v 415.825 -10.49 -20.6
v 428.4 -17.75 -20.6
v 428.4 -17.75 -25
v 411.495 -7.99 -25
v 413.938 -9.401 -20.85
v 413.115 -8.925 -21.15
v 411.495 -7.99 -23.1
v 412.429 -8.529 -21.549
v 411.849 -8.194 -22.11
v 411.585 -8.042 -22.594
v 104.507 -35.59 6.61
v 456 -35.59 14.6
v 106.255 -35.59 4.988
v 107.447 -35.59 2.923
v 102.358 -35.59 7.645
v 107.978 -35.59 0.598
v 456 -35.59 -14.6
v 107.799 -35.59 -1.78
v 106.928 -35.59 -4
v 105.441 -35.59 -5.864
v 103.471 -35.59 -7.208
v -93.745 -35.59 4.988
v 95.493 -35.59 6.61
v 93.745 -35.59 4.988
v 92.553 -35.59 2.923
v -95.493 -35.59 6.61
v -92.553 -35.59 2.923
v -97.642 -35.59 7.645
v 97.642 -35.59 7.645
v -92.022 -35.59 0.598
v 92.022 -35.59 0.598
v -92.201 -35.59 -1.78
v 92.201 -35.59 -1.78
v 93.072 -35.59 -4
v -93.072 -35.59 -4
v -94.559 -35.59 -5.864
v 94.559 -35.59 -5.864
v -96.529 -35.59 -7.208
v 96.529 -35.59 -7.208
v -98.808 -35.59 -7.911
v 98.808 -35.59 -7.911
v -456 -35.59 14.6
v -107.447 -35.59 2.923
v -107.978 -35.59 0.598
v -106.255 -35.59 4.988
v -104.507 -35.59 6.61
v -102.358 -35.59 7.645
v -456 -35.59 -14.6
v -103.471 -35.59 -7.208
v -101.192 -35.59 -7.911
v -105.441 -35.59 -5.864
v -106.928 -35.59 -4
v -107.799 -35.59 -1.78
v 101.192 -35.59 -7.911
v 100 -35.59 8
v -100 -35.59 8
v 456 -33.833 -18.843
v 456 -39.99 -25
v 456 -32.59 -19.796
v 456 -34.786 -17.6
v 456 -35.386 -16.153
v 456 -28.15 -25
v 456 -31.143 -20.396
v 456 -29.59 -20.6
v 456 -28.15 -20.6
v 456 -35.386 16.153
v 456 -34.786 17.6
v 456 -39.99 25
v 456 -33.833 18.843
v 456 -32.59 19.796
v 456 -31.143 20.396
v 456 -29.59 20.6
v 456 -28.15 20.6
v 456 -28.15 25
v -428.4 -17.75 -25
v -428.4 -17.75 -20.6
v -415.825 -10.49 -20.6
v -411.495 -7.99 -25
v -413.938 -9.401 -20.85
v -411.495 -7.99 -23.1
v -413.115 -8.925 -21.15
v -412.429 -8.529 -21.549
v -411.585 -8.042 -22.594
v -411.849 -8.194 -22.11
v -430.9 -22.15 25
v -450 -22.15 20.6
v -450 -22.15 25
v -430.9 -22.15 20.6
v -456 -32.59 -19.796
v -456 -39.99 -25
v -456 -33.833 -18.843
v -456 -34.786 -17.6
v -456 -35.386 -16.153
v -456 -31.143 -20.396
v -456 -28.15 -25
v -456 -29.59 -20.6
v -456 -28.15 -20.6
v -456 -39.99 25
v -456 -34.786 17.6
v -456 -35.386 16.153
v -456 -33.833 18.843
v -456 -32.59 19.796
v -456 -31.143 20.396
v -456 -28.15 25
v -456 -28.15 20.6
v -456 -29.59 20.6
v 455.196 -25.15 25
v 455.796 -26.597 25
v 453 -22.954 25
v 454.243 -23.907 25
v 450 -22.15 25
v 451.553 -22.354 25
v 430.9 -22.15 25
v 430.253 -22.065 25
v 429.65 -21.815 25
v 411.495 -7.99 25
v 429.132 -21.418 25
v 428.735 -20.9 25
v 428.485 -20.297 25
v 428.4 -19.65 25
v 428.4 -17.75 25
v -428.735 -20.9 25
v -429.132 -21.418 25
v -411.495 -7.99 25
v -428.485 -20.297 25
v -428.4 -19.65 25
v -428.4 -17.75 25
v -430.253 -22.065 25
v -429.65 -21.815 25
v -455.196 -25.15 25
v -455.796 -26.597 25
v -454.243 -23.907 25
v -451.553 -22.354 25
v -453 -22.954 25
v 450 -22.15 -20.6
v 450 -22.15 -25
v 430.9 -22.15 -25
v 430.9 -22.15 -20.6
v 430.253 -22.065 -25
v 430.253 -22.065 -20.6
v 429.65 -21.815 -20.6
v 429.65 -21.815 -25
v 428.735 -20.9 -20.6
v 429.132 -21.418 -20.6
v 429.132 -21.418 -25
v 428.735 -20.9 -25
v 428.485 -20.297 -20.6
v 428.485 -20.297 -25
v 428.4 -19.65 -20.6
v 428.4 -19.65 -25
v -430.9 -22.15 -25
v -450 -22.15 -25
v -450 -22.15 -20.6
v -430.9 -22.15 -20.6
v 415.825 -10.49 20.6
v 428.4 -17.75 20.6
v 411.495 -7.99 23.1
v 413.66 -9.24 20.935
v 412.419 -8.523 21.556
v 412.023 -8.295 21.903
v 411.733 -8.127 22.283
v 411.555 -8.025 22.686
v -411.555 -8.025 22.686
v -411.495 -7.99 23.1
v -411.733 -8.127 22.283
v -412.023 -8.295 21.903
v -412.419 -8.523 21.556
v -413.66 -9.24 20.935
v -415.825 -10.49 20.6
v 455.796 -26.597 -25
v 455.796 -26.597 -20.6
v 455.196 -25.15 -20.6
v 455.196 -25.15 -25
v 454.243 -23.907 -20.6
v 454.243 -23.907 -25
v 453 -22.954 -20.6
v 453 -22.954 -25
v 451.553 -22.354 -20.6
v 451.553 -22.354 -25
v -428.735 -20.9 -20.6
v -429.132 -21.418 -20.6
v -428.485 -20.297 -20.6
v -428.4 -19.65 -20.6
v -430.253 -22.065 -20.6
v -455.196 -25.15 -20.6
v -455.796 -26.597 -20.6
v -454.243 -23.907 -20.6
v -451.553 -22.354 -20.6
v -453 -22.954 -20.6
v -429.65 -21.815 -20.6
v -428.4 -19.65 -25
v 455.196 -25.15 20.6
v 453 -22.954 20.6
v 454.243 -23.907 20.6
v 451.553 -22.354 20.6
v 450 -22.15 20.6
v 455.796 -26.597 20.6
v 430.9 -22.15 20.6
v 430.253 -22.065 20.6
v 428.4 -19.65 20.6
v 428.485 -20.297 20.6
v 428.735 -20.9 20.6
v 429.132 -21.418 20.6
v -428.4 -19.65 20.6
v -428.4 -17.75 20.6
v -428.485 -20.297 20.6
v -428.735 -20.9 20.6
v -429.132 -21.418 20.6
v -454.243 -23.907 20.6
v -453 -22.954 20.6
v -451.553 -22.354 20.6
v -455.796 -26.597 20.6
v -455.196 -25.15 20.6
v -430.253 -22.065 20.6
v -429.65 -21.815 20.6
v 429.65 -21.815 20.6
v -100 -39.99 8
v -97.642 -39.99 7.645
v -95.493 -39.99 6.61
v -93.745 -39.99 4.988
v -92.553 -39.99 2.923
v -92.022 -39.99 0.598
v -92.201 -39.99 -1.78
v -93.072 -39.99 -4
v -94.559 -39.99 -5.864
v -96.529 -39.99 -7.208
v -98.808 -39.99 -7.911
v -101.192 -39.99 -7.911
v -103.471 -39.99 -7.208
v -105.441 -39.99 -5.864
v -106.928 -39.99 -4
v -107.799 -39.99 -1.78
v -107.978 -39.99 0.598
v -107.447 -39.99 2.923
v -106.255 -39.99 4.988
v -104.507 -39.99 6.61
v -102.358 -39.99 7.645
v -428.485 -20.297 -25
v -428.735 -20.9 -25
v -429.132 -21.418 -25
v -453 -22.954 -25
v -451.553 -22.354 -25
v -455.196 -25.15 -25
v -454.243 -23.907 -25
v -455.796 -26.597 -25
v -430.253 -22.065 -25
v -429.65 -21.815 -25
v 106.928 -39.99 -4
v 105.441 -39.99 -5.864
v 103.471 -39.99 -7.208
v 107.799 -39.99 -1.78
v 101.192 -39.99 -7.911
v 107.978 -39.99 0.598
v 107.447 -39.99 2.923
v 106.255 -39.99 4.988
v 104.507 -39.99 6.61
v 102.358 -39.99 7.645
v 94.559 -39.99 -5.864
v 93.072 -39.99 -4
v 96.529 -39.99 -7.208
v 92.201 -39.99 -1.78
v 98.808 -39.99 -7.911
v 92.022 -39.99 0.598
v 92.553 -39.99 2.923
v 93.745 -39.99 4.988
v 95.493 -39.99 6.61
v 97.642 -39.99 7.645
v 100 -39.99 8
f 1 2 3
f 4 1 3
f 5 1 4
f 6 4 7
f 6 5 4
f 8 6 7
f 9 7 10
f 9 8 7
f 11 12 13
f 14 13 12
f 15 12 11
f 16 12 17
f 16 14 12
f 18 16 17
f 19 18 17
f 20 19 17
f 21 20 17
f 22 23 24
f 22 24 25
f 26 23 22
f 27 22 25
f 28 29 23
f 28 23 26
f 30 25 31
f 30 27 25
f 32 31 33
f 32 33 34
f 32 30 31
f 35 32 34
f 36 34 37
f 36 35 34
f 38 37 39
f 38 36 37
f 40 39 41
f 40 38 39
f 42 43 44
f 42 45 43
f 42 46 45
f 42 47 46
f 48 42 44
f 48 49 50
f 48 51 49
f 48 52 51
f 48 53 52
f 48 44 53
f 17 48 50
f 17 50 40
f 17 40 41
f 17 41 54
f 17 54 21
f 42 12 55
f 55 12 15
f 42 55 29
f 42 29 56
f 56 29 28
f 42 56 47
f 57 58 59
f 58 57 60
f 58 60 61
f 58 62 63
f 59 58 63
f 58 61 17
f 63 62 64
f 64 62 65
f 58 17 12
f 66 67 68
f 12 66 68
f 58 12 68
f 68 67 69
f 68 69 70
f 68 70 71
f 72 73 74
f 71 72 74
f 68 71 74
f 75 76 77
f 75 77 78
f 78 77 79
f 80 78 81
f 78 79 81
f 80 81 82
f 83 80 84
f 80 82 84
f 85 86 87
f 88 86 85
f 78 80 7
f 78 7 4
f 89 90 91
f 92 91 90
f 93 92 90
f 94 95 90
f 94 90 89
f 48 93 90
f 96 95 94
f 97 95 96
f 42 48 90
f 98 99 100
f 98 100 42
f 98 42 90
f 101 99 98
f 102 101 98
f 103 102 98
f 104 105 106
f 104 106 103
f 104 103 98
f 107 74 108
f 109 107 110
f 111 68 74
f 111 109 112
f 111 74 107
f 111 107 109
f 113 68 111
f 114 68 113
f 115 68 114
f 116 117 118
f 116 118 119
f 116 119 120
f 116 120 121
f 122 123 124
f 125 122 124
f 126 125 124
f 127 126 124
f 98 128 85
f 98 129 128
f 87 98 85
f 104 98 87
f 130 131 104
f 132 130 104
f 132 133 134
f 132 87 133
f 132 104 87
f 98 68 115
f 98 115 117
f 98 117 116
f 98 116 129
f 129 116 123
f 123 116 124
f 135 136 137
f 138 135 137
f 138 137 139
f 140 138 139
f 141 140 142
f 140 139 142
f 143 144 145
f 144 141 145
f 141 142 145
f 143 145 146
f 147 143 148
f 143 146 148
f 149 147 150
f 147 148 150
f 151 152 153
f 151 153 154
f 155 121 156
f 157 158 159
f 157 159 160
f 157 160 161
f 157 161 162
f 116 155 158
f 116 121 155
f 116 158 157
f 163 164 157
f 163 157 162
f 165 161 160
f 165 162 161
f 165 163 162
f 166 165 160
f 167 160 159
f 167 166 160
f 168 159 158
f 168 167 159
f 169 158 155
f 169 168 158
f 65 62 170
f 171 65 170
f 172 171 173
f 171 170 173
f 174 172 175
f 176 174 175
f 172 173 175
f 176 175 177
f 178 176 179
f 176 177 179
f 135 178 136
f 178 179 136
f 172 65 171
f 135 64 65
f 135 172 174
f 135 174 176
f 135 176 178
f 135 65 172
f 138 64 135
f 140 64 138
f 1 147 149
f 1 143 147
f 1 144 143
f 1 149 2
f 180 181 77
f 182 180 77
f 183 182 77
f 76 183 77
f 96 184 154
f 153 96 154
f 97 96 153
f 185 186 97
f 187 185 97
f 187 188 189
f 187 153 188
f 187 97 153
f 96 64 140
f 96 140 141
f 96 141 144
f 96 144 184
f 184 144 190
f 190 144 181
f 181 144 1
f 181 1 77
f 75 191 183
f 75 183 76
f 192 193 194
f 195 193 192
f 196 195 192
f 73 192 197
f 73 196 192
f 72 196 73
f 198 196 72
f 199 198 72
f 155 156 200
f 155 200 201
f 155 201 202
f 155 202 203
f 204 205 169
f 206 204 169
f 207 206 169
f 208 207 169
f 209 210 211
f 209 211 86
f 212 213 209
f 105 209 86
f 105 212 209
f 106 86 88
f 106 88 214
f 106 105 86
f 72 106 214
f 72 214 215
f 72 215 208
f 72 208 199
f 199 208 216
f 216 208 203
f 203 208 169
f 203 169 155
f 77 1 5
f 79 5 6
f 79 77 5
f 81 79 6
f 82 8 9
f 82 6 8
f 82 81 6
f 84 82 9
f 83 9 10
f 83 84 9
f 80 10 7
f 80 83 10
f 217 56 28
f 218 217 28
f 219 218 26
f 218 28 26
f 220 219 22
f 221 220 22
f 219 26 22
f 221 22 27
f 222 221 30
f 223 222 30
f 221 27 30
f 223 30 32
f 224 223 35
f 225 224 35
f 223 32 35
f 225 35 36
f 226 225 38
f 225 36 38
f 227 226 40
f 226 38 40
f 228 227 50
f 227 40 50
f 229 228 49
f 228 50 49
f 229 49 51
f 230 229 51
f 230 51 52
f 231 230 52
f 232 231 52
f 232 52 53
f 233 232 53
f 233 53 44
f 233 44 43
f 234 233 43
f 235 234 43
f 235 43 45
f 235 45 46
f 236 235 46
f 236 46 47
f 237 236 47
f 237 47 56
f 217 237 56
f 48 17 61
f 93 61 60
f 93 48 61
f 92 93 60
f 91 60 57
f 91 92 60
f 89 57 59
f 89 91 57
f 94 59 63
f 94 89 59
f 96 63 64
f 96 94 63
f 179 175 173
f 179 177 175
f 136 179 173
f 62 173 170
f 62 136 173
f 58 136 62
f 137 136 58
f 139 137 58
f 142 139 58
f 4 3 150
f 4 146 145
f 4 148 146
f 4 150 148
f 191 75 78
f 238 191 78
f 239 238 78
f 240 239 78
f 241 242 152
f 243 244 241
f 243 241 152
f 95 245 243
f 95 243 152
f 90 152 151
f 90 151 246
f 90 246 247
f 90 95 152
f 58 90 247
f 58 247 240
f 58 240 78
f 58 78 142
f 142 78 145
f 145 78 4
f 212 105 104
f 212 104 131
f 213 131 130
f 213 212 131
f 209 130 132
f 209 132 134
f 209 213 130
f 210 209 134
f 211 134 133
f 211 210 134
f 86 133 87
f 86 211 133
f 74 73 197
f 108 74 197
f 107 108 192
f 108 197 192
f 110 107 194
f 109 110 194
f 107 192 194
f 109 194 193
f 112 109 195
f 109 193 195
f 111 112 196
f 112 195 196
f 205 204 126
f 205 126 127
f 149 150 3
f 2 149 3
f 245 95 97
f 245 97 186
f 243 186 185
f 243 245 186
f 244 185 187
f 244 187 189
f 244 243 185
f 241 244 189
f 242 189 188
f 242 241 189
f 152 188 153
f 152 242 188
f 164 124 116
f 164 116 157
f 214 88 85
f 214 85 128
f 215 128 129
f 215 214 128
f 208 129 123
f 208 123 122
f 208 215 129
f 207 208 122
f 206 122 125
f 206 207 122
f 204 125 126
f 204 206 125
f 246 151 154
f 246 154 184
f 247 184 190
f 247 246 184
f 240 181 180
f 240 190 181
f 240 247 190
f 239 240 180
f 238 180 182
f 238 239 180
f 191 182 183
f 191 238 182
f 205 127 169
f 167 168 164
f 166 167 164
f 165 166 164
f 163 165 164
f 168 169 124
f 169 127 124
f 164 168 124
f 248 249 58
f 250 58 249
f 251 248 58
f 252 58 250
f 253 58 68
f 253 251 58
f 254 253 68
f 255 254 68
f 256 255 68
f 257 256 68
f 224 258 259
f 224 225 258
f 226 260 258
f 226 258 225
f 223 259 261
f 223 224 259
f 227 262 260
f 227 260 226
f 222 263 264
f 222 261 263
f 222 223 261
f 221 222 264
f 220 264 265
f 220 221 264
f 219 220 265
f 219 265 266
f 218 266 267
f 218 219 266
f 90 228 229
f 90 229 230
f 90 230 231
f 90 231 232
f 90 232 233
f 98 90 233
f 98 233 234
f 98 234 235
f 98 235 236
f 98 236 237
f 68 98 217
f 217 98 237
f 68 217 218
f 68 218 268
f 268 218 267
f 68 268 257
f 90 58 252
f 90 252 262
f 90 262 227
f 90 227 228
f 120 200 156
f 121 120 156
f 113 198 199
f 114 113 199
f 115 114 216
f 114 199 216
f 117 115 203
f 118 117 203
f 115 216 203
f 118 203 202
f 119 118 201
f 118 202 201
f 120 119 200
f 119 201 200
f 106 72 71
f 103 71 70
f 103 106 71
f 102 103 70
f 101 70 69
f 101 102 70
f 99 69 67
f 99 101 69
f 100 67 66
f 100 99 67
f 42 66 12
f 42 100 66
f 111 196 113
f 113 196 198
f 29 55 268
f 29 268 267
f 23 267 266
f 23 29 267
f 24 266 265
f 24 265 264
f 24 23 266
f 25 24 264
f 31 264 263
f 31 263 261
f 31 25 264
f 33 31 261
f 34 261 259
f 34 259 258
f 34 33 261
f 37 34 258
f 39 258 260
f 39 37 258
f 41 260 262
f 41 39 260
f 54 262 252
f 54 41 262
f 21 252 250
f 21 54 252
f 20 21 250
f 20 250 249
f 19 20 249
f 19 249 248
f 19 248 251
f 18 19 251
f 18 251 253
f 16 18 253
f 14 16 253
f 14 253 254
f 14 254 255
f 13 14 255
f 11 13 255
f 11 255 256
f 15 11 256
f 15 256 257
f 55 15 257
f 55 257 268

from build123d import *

# Parameters (mm, degrees)
EXTRUDE_1_DEPTH     = 456
SKETCH_2_R          = 8
CUT_EXTRUDE_1_DEPTH = 458.51804336
OTHER_START         = -25
OTHER_1_DEPTH       = 50
CUT_EXTRUDE_2_DEPTH = 461.472800608


# Read off the part's stored shape, not the designer's step: Полость1
with BuildPart() as part:
    # Эскиз1 → Бобышка-Вытянуть1 (new body)
    with BuildSketch(Plane(origin=(0, 0, 0), x_dir=(0, 0, -1), z_dir=(1, 0, 0))):
        with BuildLine():
            Line((25, -39.99), (-25, -39.99))
            Line((-25, -39.99), (-25, -7.99))
            Line((-25, -7.99), (-23.1, -7.99))
            ThreePointArc((-23.1, -7.99), (-21.332233047, -8.722233047), (-20.6, -10.49))
            Line((-20.6, -10.49), (-20.6, -29.59))
            ThreePointArc((-20.6, -29.59), (-18.842640687, -33.832640687), (-14.6, -35.59))
            Line((-14.6, -35.59), (14.6, -35.59))
            ThreePointArc((14.6, -35.59), (18.842640687, -33.832640687), (20.6, -29.59))
            Line((20.6, -29.59), (20.6, -10.49))
            ThreePointArc((20.6, -10.49), (21.332233047, -8.722233047), (23.1, -7.99))
            Line((23.1, -7.99), (25, -7.99))
            Line((25, -7.99), (25, -39.99))
        make_face()
    extrude(amount=-EXTRUDE_1_DEPTH)

    # Эскиз2 → Вырез-Вытянуть1 (cut, through all)
    with BuildSketch(Plane(origin=(0, -35.59, 0), x_dir=(1, 0, 0), z_dir=(0, 1, 0))):
        with Locations(Location((-100, 0, 0), (0, 0, 270))):
            Circle(SKETCH_2_R)
    extrude(amount=-CUT_EXTRUDE_1_DEPTH, mode=Mode.SUBTRACT)

    # Полость1 outline → Полость1 (cut)
    with BuildSketch(Plane.XY.offset(OTHER_START)):
        with BuildLine():
            Line((-428.4, -17.75), (-456, -17.75))
            Line((-456, -17.75), (-456, -28.15))
            ThreePointArc((-456, -28.15), (-454.242640687, -23.907359313), (-450, -22.15))
            Line((-450, -22.15), (-430.9, -22.15))
            ThreePointArc((-430.9, -22.15), (-429.132233047, -21.417766953), (-428.4, -19.65))
            Line((-428.4, -19.65), (-428.4, -17.75))
        make_face()
    extrude(amount=OTHER_1_DEPTH, mode=Mode.SUBTRACT)

    # Эскиз3 → Вырез-Вытянуть2 (cut, through all)
    with BuildSketch(Plane.XY.offset(25)):
        Polygon((-456, -17.75), (-428.4, -17.75), (-411.495184118, -7.99), (-456, -7.99), align=None)
    extrude(amount=-CUT_EXTRUDE_2_DEPTH, mode=Mode.SUBTRACT)

    # Зеркальное отражение1: part across plane


with BuildPart() as part_1:
    add(part.part)
    add(part.part.mirror(Plane(origin=(0, -10.49, 23.1), x_dir=(0, 0, 1), z_dir=(-1, 0, 0))))


solid = part_1.part
